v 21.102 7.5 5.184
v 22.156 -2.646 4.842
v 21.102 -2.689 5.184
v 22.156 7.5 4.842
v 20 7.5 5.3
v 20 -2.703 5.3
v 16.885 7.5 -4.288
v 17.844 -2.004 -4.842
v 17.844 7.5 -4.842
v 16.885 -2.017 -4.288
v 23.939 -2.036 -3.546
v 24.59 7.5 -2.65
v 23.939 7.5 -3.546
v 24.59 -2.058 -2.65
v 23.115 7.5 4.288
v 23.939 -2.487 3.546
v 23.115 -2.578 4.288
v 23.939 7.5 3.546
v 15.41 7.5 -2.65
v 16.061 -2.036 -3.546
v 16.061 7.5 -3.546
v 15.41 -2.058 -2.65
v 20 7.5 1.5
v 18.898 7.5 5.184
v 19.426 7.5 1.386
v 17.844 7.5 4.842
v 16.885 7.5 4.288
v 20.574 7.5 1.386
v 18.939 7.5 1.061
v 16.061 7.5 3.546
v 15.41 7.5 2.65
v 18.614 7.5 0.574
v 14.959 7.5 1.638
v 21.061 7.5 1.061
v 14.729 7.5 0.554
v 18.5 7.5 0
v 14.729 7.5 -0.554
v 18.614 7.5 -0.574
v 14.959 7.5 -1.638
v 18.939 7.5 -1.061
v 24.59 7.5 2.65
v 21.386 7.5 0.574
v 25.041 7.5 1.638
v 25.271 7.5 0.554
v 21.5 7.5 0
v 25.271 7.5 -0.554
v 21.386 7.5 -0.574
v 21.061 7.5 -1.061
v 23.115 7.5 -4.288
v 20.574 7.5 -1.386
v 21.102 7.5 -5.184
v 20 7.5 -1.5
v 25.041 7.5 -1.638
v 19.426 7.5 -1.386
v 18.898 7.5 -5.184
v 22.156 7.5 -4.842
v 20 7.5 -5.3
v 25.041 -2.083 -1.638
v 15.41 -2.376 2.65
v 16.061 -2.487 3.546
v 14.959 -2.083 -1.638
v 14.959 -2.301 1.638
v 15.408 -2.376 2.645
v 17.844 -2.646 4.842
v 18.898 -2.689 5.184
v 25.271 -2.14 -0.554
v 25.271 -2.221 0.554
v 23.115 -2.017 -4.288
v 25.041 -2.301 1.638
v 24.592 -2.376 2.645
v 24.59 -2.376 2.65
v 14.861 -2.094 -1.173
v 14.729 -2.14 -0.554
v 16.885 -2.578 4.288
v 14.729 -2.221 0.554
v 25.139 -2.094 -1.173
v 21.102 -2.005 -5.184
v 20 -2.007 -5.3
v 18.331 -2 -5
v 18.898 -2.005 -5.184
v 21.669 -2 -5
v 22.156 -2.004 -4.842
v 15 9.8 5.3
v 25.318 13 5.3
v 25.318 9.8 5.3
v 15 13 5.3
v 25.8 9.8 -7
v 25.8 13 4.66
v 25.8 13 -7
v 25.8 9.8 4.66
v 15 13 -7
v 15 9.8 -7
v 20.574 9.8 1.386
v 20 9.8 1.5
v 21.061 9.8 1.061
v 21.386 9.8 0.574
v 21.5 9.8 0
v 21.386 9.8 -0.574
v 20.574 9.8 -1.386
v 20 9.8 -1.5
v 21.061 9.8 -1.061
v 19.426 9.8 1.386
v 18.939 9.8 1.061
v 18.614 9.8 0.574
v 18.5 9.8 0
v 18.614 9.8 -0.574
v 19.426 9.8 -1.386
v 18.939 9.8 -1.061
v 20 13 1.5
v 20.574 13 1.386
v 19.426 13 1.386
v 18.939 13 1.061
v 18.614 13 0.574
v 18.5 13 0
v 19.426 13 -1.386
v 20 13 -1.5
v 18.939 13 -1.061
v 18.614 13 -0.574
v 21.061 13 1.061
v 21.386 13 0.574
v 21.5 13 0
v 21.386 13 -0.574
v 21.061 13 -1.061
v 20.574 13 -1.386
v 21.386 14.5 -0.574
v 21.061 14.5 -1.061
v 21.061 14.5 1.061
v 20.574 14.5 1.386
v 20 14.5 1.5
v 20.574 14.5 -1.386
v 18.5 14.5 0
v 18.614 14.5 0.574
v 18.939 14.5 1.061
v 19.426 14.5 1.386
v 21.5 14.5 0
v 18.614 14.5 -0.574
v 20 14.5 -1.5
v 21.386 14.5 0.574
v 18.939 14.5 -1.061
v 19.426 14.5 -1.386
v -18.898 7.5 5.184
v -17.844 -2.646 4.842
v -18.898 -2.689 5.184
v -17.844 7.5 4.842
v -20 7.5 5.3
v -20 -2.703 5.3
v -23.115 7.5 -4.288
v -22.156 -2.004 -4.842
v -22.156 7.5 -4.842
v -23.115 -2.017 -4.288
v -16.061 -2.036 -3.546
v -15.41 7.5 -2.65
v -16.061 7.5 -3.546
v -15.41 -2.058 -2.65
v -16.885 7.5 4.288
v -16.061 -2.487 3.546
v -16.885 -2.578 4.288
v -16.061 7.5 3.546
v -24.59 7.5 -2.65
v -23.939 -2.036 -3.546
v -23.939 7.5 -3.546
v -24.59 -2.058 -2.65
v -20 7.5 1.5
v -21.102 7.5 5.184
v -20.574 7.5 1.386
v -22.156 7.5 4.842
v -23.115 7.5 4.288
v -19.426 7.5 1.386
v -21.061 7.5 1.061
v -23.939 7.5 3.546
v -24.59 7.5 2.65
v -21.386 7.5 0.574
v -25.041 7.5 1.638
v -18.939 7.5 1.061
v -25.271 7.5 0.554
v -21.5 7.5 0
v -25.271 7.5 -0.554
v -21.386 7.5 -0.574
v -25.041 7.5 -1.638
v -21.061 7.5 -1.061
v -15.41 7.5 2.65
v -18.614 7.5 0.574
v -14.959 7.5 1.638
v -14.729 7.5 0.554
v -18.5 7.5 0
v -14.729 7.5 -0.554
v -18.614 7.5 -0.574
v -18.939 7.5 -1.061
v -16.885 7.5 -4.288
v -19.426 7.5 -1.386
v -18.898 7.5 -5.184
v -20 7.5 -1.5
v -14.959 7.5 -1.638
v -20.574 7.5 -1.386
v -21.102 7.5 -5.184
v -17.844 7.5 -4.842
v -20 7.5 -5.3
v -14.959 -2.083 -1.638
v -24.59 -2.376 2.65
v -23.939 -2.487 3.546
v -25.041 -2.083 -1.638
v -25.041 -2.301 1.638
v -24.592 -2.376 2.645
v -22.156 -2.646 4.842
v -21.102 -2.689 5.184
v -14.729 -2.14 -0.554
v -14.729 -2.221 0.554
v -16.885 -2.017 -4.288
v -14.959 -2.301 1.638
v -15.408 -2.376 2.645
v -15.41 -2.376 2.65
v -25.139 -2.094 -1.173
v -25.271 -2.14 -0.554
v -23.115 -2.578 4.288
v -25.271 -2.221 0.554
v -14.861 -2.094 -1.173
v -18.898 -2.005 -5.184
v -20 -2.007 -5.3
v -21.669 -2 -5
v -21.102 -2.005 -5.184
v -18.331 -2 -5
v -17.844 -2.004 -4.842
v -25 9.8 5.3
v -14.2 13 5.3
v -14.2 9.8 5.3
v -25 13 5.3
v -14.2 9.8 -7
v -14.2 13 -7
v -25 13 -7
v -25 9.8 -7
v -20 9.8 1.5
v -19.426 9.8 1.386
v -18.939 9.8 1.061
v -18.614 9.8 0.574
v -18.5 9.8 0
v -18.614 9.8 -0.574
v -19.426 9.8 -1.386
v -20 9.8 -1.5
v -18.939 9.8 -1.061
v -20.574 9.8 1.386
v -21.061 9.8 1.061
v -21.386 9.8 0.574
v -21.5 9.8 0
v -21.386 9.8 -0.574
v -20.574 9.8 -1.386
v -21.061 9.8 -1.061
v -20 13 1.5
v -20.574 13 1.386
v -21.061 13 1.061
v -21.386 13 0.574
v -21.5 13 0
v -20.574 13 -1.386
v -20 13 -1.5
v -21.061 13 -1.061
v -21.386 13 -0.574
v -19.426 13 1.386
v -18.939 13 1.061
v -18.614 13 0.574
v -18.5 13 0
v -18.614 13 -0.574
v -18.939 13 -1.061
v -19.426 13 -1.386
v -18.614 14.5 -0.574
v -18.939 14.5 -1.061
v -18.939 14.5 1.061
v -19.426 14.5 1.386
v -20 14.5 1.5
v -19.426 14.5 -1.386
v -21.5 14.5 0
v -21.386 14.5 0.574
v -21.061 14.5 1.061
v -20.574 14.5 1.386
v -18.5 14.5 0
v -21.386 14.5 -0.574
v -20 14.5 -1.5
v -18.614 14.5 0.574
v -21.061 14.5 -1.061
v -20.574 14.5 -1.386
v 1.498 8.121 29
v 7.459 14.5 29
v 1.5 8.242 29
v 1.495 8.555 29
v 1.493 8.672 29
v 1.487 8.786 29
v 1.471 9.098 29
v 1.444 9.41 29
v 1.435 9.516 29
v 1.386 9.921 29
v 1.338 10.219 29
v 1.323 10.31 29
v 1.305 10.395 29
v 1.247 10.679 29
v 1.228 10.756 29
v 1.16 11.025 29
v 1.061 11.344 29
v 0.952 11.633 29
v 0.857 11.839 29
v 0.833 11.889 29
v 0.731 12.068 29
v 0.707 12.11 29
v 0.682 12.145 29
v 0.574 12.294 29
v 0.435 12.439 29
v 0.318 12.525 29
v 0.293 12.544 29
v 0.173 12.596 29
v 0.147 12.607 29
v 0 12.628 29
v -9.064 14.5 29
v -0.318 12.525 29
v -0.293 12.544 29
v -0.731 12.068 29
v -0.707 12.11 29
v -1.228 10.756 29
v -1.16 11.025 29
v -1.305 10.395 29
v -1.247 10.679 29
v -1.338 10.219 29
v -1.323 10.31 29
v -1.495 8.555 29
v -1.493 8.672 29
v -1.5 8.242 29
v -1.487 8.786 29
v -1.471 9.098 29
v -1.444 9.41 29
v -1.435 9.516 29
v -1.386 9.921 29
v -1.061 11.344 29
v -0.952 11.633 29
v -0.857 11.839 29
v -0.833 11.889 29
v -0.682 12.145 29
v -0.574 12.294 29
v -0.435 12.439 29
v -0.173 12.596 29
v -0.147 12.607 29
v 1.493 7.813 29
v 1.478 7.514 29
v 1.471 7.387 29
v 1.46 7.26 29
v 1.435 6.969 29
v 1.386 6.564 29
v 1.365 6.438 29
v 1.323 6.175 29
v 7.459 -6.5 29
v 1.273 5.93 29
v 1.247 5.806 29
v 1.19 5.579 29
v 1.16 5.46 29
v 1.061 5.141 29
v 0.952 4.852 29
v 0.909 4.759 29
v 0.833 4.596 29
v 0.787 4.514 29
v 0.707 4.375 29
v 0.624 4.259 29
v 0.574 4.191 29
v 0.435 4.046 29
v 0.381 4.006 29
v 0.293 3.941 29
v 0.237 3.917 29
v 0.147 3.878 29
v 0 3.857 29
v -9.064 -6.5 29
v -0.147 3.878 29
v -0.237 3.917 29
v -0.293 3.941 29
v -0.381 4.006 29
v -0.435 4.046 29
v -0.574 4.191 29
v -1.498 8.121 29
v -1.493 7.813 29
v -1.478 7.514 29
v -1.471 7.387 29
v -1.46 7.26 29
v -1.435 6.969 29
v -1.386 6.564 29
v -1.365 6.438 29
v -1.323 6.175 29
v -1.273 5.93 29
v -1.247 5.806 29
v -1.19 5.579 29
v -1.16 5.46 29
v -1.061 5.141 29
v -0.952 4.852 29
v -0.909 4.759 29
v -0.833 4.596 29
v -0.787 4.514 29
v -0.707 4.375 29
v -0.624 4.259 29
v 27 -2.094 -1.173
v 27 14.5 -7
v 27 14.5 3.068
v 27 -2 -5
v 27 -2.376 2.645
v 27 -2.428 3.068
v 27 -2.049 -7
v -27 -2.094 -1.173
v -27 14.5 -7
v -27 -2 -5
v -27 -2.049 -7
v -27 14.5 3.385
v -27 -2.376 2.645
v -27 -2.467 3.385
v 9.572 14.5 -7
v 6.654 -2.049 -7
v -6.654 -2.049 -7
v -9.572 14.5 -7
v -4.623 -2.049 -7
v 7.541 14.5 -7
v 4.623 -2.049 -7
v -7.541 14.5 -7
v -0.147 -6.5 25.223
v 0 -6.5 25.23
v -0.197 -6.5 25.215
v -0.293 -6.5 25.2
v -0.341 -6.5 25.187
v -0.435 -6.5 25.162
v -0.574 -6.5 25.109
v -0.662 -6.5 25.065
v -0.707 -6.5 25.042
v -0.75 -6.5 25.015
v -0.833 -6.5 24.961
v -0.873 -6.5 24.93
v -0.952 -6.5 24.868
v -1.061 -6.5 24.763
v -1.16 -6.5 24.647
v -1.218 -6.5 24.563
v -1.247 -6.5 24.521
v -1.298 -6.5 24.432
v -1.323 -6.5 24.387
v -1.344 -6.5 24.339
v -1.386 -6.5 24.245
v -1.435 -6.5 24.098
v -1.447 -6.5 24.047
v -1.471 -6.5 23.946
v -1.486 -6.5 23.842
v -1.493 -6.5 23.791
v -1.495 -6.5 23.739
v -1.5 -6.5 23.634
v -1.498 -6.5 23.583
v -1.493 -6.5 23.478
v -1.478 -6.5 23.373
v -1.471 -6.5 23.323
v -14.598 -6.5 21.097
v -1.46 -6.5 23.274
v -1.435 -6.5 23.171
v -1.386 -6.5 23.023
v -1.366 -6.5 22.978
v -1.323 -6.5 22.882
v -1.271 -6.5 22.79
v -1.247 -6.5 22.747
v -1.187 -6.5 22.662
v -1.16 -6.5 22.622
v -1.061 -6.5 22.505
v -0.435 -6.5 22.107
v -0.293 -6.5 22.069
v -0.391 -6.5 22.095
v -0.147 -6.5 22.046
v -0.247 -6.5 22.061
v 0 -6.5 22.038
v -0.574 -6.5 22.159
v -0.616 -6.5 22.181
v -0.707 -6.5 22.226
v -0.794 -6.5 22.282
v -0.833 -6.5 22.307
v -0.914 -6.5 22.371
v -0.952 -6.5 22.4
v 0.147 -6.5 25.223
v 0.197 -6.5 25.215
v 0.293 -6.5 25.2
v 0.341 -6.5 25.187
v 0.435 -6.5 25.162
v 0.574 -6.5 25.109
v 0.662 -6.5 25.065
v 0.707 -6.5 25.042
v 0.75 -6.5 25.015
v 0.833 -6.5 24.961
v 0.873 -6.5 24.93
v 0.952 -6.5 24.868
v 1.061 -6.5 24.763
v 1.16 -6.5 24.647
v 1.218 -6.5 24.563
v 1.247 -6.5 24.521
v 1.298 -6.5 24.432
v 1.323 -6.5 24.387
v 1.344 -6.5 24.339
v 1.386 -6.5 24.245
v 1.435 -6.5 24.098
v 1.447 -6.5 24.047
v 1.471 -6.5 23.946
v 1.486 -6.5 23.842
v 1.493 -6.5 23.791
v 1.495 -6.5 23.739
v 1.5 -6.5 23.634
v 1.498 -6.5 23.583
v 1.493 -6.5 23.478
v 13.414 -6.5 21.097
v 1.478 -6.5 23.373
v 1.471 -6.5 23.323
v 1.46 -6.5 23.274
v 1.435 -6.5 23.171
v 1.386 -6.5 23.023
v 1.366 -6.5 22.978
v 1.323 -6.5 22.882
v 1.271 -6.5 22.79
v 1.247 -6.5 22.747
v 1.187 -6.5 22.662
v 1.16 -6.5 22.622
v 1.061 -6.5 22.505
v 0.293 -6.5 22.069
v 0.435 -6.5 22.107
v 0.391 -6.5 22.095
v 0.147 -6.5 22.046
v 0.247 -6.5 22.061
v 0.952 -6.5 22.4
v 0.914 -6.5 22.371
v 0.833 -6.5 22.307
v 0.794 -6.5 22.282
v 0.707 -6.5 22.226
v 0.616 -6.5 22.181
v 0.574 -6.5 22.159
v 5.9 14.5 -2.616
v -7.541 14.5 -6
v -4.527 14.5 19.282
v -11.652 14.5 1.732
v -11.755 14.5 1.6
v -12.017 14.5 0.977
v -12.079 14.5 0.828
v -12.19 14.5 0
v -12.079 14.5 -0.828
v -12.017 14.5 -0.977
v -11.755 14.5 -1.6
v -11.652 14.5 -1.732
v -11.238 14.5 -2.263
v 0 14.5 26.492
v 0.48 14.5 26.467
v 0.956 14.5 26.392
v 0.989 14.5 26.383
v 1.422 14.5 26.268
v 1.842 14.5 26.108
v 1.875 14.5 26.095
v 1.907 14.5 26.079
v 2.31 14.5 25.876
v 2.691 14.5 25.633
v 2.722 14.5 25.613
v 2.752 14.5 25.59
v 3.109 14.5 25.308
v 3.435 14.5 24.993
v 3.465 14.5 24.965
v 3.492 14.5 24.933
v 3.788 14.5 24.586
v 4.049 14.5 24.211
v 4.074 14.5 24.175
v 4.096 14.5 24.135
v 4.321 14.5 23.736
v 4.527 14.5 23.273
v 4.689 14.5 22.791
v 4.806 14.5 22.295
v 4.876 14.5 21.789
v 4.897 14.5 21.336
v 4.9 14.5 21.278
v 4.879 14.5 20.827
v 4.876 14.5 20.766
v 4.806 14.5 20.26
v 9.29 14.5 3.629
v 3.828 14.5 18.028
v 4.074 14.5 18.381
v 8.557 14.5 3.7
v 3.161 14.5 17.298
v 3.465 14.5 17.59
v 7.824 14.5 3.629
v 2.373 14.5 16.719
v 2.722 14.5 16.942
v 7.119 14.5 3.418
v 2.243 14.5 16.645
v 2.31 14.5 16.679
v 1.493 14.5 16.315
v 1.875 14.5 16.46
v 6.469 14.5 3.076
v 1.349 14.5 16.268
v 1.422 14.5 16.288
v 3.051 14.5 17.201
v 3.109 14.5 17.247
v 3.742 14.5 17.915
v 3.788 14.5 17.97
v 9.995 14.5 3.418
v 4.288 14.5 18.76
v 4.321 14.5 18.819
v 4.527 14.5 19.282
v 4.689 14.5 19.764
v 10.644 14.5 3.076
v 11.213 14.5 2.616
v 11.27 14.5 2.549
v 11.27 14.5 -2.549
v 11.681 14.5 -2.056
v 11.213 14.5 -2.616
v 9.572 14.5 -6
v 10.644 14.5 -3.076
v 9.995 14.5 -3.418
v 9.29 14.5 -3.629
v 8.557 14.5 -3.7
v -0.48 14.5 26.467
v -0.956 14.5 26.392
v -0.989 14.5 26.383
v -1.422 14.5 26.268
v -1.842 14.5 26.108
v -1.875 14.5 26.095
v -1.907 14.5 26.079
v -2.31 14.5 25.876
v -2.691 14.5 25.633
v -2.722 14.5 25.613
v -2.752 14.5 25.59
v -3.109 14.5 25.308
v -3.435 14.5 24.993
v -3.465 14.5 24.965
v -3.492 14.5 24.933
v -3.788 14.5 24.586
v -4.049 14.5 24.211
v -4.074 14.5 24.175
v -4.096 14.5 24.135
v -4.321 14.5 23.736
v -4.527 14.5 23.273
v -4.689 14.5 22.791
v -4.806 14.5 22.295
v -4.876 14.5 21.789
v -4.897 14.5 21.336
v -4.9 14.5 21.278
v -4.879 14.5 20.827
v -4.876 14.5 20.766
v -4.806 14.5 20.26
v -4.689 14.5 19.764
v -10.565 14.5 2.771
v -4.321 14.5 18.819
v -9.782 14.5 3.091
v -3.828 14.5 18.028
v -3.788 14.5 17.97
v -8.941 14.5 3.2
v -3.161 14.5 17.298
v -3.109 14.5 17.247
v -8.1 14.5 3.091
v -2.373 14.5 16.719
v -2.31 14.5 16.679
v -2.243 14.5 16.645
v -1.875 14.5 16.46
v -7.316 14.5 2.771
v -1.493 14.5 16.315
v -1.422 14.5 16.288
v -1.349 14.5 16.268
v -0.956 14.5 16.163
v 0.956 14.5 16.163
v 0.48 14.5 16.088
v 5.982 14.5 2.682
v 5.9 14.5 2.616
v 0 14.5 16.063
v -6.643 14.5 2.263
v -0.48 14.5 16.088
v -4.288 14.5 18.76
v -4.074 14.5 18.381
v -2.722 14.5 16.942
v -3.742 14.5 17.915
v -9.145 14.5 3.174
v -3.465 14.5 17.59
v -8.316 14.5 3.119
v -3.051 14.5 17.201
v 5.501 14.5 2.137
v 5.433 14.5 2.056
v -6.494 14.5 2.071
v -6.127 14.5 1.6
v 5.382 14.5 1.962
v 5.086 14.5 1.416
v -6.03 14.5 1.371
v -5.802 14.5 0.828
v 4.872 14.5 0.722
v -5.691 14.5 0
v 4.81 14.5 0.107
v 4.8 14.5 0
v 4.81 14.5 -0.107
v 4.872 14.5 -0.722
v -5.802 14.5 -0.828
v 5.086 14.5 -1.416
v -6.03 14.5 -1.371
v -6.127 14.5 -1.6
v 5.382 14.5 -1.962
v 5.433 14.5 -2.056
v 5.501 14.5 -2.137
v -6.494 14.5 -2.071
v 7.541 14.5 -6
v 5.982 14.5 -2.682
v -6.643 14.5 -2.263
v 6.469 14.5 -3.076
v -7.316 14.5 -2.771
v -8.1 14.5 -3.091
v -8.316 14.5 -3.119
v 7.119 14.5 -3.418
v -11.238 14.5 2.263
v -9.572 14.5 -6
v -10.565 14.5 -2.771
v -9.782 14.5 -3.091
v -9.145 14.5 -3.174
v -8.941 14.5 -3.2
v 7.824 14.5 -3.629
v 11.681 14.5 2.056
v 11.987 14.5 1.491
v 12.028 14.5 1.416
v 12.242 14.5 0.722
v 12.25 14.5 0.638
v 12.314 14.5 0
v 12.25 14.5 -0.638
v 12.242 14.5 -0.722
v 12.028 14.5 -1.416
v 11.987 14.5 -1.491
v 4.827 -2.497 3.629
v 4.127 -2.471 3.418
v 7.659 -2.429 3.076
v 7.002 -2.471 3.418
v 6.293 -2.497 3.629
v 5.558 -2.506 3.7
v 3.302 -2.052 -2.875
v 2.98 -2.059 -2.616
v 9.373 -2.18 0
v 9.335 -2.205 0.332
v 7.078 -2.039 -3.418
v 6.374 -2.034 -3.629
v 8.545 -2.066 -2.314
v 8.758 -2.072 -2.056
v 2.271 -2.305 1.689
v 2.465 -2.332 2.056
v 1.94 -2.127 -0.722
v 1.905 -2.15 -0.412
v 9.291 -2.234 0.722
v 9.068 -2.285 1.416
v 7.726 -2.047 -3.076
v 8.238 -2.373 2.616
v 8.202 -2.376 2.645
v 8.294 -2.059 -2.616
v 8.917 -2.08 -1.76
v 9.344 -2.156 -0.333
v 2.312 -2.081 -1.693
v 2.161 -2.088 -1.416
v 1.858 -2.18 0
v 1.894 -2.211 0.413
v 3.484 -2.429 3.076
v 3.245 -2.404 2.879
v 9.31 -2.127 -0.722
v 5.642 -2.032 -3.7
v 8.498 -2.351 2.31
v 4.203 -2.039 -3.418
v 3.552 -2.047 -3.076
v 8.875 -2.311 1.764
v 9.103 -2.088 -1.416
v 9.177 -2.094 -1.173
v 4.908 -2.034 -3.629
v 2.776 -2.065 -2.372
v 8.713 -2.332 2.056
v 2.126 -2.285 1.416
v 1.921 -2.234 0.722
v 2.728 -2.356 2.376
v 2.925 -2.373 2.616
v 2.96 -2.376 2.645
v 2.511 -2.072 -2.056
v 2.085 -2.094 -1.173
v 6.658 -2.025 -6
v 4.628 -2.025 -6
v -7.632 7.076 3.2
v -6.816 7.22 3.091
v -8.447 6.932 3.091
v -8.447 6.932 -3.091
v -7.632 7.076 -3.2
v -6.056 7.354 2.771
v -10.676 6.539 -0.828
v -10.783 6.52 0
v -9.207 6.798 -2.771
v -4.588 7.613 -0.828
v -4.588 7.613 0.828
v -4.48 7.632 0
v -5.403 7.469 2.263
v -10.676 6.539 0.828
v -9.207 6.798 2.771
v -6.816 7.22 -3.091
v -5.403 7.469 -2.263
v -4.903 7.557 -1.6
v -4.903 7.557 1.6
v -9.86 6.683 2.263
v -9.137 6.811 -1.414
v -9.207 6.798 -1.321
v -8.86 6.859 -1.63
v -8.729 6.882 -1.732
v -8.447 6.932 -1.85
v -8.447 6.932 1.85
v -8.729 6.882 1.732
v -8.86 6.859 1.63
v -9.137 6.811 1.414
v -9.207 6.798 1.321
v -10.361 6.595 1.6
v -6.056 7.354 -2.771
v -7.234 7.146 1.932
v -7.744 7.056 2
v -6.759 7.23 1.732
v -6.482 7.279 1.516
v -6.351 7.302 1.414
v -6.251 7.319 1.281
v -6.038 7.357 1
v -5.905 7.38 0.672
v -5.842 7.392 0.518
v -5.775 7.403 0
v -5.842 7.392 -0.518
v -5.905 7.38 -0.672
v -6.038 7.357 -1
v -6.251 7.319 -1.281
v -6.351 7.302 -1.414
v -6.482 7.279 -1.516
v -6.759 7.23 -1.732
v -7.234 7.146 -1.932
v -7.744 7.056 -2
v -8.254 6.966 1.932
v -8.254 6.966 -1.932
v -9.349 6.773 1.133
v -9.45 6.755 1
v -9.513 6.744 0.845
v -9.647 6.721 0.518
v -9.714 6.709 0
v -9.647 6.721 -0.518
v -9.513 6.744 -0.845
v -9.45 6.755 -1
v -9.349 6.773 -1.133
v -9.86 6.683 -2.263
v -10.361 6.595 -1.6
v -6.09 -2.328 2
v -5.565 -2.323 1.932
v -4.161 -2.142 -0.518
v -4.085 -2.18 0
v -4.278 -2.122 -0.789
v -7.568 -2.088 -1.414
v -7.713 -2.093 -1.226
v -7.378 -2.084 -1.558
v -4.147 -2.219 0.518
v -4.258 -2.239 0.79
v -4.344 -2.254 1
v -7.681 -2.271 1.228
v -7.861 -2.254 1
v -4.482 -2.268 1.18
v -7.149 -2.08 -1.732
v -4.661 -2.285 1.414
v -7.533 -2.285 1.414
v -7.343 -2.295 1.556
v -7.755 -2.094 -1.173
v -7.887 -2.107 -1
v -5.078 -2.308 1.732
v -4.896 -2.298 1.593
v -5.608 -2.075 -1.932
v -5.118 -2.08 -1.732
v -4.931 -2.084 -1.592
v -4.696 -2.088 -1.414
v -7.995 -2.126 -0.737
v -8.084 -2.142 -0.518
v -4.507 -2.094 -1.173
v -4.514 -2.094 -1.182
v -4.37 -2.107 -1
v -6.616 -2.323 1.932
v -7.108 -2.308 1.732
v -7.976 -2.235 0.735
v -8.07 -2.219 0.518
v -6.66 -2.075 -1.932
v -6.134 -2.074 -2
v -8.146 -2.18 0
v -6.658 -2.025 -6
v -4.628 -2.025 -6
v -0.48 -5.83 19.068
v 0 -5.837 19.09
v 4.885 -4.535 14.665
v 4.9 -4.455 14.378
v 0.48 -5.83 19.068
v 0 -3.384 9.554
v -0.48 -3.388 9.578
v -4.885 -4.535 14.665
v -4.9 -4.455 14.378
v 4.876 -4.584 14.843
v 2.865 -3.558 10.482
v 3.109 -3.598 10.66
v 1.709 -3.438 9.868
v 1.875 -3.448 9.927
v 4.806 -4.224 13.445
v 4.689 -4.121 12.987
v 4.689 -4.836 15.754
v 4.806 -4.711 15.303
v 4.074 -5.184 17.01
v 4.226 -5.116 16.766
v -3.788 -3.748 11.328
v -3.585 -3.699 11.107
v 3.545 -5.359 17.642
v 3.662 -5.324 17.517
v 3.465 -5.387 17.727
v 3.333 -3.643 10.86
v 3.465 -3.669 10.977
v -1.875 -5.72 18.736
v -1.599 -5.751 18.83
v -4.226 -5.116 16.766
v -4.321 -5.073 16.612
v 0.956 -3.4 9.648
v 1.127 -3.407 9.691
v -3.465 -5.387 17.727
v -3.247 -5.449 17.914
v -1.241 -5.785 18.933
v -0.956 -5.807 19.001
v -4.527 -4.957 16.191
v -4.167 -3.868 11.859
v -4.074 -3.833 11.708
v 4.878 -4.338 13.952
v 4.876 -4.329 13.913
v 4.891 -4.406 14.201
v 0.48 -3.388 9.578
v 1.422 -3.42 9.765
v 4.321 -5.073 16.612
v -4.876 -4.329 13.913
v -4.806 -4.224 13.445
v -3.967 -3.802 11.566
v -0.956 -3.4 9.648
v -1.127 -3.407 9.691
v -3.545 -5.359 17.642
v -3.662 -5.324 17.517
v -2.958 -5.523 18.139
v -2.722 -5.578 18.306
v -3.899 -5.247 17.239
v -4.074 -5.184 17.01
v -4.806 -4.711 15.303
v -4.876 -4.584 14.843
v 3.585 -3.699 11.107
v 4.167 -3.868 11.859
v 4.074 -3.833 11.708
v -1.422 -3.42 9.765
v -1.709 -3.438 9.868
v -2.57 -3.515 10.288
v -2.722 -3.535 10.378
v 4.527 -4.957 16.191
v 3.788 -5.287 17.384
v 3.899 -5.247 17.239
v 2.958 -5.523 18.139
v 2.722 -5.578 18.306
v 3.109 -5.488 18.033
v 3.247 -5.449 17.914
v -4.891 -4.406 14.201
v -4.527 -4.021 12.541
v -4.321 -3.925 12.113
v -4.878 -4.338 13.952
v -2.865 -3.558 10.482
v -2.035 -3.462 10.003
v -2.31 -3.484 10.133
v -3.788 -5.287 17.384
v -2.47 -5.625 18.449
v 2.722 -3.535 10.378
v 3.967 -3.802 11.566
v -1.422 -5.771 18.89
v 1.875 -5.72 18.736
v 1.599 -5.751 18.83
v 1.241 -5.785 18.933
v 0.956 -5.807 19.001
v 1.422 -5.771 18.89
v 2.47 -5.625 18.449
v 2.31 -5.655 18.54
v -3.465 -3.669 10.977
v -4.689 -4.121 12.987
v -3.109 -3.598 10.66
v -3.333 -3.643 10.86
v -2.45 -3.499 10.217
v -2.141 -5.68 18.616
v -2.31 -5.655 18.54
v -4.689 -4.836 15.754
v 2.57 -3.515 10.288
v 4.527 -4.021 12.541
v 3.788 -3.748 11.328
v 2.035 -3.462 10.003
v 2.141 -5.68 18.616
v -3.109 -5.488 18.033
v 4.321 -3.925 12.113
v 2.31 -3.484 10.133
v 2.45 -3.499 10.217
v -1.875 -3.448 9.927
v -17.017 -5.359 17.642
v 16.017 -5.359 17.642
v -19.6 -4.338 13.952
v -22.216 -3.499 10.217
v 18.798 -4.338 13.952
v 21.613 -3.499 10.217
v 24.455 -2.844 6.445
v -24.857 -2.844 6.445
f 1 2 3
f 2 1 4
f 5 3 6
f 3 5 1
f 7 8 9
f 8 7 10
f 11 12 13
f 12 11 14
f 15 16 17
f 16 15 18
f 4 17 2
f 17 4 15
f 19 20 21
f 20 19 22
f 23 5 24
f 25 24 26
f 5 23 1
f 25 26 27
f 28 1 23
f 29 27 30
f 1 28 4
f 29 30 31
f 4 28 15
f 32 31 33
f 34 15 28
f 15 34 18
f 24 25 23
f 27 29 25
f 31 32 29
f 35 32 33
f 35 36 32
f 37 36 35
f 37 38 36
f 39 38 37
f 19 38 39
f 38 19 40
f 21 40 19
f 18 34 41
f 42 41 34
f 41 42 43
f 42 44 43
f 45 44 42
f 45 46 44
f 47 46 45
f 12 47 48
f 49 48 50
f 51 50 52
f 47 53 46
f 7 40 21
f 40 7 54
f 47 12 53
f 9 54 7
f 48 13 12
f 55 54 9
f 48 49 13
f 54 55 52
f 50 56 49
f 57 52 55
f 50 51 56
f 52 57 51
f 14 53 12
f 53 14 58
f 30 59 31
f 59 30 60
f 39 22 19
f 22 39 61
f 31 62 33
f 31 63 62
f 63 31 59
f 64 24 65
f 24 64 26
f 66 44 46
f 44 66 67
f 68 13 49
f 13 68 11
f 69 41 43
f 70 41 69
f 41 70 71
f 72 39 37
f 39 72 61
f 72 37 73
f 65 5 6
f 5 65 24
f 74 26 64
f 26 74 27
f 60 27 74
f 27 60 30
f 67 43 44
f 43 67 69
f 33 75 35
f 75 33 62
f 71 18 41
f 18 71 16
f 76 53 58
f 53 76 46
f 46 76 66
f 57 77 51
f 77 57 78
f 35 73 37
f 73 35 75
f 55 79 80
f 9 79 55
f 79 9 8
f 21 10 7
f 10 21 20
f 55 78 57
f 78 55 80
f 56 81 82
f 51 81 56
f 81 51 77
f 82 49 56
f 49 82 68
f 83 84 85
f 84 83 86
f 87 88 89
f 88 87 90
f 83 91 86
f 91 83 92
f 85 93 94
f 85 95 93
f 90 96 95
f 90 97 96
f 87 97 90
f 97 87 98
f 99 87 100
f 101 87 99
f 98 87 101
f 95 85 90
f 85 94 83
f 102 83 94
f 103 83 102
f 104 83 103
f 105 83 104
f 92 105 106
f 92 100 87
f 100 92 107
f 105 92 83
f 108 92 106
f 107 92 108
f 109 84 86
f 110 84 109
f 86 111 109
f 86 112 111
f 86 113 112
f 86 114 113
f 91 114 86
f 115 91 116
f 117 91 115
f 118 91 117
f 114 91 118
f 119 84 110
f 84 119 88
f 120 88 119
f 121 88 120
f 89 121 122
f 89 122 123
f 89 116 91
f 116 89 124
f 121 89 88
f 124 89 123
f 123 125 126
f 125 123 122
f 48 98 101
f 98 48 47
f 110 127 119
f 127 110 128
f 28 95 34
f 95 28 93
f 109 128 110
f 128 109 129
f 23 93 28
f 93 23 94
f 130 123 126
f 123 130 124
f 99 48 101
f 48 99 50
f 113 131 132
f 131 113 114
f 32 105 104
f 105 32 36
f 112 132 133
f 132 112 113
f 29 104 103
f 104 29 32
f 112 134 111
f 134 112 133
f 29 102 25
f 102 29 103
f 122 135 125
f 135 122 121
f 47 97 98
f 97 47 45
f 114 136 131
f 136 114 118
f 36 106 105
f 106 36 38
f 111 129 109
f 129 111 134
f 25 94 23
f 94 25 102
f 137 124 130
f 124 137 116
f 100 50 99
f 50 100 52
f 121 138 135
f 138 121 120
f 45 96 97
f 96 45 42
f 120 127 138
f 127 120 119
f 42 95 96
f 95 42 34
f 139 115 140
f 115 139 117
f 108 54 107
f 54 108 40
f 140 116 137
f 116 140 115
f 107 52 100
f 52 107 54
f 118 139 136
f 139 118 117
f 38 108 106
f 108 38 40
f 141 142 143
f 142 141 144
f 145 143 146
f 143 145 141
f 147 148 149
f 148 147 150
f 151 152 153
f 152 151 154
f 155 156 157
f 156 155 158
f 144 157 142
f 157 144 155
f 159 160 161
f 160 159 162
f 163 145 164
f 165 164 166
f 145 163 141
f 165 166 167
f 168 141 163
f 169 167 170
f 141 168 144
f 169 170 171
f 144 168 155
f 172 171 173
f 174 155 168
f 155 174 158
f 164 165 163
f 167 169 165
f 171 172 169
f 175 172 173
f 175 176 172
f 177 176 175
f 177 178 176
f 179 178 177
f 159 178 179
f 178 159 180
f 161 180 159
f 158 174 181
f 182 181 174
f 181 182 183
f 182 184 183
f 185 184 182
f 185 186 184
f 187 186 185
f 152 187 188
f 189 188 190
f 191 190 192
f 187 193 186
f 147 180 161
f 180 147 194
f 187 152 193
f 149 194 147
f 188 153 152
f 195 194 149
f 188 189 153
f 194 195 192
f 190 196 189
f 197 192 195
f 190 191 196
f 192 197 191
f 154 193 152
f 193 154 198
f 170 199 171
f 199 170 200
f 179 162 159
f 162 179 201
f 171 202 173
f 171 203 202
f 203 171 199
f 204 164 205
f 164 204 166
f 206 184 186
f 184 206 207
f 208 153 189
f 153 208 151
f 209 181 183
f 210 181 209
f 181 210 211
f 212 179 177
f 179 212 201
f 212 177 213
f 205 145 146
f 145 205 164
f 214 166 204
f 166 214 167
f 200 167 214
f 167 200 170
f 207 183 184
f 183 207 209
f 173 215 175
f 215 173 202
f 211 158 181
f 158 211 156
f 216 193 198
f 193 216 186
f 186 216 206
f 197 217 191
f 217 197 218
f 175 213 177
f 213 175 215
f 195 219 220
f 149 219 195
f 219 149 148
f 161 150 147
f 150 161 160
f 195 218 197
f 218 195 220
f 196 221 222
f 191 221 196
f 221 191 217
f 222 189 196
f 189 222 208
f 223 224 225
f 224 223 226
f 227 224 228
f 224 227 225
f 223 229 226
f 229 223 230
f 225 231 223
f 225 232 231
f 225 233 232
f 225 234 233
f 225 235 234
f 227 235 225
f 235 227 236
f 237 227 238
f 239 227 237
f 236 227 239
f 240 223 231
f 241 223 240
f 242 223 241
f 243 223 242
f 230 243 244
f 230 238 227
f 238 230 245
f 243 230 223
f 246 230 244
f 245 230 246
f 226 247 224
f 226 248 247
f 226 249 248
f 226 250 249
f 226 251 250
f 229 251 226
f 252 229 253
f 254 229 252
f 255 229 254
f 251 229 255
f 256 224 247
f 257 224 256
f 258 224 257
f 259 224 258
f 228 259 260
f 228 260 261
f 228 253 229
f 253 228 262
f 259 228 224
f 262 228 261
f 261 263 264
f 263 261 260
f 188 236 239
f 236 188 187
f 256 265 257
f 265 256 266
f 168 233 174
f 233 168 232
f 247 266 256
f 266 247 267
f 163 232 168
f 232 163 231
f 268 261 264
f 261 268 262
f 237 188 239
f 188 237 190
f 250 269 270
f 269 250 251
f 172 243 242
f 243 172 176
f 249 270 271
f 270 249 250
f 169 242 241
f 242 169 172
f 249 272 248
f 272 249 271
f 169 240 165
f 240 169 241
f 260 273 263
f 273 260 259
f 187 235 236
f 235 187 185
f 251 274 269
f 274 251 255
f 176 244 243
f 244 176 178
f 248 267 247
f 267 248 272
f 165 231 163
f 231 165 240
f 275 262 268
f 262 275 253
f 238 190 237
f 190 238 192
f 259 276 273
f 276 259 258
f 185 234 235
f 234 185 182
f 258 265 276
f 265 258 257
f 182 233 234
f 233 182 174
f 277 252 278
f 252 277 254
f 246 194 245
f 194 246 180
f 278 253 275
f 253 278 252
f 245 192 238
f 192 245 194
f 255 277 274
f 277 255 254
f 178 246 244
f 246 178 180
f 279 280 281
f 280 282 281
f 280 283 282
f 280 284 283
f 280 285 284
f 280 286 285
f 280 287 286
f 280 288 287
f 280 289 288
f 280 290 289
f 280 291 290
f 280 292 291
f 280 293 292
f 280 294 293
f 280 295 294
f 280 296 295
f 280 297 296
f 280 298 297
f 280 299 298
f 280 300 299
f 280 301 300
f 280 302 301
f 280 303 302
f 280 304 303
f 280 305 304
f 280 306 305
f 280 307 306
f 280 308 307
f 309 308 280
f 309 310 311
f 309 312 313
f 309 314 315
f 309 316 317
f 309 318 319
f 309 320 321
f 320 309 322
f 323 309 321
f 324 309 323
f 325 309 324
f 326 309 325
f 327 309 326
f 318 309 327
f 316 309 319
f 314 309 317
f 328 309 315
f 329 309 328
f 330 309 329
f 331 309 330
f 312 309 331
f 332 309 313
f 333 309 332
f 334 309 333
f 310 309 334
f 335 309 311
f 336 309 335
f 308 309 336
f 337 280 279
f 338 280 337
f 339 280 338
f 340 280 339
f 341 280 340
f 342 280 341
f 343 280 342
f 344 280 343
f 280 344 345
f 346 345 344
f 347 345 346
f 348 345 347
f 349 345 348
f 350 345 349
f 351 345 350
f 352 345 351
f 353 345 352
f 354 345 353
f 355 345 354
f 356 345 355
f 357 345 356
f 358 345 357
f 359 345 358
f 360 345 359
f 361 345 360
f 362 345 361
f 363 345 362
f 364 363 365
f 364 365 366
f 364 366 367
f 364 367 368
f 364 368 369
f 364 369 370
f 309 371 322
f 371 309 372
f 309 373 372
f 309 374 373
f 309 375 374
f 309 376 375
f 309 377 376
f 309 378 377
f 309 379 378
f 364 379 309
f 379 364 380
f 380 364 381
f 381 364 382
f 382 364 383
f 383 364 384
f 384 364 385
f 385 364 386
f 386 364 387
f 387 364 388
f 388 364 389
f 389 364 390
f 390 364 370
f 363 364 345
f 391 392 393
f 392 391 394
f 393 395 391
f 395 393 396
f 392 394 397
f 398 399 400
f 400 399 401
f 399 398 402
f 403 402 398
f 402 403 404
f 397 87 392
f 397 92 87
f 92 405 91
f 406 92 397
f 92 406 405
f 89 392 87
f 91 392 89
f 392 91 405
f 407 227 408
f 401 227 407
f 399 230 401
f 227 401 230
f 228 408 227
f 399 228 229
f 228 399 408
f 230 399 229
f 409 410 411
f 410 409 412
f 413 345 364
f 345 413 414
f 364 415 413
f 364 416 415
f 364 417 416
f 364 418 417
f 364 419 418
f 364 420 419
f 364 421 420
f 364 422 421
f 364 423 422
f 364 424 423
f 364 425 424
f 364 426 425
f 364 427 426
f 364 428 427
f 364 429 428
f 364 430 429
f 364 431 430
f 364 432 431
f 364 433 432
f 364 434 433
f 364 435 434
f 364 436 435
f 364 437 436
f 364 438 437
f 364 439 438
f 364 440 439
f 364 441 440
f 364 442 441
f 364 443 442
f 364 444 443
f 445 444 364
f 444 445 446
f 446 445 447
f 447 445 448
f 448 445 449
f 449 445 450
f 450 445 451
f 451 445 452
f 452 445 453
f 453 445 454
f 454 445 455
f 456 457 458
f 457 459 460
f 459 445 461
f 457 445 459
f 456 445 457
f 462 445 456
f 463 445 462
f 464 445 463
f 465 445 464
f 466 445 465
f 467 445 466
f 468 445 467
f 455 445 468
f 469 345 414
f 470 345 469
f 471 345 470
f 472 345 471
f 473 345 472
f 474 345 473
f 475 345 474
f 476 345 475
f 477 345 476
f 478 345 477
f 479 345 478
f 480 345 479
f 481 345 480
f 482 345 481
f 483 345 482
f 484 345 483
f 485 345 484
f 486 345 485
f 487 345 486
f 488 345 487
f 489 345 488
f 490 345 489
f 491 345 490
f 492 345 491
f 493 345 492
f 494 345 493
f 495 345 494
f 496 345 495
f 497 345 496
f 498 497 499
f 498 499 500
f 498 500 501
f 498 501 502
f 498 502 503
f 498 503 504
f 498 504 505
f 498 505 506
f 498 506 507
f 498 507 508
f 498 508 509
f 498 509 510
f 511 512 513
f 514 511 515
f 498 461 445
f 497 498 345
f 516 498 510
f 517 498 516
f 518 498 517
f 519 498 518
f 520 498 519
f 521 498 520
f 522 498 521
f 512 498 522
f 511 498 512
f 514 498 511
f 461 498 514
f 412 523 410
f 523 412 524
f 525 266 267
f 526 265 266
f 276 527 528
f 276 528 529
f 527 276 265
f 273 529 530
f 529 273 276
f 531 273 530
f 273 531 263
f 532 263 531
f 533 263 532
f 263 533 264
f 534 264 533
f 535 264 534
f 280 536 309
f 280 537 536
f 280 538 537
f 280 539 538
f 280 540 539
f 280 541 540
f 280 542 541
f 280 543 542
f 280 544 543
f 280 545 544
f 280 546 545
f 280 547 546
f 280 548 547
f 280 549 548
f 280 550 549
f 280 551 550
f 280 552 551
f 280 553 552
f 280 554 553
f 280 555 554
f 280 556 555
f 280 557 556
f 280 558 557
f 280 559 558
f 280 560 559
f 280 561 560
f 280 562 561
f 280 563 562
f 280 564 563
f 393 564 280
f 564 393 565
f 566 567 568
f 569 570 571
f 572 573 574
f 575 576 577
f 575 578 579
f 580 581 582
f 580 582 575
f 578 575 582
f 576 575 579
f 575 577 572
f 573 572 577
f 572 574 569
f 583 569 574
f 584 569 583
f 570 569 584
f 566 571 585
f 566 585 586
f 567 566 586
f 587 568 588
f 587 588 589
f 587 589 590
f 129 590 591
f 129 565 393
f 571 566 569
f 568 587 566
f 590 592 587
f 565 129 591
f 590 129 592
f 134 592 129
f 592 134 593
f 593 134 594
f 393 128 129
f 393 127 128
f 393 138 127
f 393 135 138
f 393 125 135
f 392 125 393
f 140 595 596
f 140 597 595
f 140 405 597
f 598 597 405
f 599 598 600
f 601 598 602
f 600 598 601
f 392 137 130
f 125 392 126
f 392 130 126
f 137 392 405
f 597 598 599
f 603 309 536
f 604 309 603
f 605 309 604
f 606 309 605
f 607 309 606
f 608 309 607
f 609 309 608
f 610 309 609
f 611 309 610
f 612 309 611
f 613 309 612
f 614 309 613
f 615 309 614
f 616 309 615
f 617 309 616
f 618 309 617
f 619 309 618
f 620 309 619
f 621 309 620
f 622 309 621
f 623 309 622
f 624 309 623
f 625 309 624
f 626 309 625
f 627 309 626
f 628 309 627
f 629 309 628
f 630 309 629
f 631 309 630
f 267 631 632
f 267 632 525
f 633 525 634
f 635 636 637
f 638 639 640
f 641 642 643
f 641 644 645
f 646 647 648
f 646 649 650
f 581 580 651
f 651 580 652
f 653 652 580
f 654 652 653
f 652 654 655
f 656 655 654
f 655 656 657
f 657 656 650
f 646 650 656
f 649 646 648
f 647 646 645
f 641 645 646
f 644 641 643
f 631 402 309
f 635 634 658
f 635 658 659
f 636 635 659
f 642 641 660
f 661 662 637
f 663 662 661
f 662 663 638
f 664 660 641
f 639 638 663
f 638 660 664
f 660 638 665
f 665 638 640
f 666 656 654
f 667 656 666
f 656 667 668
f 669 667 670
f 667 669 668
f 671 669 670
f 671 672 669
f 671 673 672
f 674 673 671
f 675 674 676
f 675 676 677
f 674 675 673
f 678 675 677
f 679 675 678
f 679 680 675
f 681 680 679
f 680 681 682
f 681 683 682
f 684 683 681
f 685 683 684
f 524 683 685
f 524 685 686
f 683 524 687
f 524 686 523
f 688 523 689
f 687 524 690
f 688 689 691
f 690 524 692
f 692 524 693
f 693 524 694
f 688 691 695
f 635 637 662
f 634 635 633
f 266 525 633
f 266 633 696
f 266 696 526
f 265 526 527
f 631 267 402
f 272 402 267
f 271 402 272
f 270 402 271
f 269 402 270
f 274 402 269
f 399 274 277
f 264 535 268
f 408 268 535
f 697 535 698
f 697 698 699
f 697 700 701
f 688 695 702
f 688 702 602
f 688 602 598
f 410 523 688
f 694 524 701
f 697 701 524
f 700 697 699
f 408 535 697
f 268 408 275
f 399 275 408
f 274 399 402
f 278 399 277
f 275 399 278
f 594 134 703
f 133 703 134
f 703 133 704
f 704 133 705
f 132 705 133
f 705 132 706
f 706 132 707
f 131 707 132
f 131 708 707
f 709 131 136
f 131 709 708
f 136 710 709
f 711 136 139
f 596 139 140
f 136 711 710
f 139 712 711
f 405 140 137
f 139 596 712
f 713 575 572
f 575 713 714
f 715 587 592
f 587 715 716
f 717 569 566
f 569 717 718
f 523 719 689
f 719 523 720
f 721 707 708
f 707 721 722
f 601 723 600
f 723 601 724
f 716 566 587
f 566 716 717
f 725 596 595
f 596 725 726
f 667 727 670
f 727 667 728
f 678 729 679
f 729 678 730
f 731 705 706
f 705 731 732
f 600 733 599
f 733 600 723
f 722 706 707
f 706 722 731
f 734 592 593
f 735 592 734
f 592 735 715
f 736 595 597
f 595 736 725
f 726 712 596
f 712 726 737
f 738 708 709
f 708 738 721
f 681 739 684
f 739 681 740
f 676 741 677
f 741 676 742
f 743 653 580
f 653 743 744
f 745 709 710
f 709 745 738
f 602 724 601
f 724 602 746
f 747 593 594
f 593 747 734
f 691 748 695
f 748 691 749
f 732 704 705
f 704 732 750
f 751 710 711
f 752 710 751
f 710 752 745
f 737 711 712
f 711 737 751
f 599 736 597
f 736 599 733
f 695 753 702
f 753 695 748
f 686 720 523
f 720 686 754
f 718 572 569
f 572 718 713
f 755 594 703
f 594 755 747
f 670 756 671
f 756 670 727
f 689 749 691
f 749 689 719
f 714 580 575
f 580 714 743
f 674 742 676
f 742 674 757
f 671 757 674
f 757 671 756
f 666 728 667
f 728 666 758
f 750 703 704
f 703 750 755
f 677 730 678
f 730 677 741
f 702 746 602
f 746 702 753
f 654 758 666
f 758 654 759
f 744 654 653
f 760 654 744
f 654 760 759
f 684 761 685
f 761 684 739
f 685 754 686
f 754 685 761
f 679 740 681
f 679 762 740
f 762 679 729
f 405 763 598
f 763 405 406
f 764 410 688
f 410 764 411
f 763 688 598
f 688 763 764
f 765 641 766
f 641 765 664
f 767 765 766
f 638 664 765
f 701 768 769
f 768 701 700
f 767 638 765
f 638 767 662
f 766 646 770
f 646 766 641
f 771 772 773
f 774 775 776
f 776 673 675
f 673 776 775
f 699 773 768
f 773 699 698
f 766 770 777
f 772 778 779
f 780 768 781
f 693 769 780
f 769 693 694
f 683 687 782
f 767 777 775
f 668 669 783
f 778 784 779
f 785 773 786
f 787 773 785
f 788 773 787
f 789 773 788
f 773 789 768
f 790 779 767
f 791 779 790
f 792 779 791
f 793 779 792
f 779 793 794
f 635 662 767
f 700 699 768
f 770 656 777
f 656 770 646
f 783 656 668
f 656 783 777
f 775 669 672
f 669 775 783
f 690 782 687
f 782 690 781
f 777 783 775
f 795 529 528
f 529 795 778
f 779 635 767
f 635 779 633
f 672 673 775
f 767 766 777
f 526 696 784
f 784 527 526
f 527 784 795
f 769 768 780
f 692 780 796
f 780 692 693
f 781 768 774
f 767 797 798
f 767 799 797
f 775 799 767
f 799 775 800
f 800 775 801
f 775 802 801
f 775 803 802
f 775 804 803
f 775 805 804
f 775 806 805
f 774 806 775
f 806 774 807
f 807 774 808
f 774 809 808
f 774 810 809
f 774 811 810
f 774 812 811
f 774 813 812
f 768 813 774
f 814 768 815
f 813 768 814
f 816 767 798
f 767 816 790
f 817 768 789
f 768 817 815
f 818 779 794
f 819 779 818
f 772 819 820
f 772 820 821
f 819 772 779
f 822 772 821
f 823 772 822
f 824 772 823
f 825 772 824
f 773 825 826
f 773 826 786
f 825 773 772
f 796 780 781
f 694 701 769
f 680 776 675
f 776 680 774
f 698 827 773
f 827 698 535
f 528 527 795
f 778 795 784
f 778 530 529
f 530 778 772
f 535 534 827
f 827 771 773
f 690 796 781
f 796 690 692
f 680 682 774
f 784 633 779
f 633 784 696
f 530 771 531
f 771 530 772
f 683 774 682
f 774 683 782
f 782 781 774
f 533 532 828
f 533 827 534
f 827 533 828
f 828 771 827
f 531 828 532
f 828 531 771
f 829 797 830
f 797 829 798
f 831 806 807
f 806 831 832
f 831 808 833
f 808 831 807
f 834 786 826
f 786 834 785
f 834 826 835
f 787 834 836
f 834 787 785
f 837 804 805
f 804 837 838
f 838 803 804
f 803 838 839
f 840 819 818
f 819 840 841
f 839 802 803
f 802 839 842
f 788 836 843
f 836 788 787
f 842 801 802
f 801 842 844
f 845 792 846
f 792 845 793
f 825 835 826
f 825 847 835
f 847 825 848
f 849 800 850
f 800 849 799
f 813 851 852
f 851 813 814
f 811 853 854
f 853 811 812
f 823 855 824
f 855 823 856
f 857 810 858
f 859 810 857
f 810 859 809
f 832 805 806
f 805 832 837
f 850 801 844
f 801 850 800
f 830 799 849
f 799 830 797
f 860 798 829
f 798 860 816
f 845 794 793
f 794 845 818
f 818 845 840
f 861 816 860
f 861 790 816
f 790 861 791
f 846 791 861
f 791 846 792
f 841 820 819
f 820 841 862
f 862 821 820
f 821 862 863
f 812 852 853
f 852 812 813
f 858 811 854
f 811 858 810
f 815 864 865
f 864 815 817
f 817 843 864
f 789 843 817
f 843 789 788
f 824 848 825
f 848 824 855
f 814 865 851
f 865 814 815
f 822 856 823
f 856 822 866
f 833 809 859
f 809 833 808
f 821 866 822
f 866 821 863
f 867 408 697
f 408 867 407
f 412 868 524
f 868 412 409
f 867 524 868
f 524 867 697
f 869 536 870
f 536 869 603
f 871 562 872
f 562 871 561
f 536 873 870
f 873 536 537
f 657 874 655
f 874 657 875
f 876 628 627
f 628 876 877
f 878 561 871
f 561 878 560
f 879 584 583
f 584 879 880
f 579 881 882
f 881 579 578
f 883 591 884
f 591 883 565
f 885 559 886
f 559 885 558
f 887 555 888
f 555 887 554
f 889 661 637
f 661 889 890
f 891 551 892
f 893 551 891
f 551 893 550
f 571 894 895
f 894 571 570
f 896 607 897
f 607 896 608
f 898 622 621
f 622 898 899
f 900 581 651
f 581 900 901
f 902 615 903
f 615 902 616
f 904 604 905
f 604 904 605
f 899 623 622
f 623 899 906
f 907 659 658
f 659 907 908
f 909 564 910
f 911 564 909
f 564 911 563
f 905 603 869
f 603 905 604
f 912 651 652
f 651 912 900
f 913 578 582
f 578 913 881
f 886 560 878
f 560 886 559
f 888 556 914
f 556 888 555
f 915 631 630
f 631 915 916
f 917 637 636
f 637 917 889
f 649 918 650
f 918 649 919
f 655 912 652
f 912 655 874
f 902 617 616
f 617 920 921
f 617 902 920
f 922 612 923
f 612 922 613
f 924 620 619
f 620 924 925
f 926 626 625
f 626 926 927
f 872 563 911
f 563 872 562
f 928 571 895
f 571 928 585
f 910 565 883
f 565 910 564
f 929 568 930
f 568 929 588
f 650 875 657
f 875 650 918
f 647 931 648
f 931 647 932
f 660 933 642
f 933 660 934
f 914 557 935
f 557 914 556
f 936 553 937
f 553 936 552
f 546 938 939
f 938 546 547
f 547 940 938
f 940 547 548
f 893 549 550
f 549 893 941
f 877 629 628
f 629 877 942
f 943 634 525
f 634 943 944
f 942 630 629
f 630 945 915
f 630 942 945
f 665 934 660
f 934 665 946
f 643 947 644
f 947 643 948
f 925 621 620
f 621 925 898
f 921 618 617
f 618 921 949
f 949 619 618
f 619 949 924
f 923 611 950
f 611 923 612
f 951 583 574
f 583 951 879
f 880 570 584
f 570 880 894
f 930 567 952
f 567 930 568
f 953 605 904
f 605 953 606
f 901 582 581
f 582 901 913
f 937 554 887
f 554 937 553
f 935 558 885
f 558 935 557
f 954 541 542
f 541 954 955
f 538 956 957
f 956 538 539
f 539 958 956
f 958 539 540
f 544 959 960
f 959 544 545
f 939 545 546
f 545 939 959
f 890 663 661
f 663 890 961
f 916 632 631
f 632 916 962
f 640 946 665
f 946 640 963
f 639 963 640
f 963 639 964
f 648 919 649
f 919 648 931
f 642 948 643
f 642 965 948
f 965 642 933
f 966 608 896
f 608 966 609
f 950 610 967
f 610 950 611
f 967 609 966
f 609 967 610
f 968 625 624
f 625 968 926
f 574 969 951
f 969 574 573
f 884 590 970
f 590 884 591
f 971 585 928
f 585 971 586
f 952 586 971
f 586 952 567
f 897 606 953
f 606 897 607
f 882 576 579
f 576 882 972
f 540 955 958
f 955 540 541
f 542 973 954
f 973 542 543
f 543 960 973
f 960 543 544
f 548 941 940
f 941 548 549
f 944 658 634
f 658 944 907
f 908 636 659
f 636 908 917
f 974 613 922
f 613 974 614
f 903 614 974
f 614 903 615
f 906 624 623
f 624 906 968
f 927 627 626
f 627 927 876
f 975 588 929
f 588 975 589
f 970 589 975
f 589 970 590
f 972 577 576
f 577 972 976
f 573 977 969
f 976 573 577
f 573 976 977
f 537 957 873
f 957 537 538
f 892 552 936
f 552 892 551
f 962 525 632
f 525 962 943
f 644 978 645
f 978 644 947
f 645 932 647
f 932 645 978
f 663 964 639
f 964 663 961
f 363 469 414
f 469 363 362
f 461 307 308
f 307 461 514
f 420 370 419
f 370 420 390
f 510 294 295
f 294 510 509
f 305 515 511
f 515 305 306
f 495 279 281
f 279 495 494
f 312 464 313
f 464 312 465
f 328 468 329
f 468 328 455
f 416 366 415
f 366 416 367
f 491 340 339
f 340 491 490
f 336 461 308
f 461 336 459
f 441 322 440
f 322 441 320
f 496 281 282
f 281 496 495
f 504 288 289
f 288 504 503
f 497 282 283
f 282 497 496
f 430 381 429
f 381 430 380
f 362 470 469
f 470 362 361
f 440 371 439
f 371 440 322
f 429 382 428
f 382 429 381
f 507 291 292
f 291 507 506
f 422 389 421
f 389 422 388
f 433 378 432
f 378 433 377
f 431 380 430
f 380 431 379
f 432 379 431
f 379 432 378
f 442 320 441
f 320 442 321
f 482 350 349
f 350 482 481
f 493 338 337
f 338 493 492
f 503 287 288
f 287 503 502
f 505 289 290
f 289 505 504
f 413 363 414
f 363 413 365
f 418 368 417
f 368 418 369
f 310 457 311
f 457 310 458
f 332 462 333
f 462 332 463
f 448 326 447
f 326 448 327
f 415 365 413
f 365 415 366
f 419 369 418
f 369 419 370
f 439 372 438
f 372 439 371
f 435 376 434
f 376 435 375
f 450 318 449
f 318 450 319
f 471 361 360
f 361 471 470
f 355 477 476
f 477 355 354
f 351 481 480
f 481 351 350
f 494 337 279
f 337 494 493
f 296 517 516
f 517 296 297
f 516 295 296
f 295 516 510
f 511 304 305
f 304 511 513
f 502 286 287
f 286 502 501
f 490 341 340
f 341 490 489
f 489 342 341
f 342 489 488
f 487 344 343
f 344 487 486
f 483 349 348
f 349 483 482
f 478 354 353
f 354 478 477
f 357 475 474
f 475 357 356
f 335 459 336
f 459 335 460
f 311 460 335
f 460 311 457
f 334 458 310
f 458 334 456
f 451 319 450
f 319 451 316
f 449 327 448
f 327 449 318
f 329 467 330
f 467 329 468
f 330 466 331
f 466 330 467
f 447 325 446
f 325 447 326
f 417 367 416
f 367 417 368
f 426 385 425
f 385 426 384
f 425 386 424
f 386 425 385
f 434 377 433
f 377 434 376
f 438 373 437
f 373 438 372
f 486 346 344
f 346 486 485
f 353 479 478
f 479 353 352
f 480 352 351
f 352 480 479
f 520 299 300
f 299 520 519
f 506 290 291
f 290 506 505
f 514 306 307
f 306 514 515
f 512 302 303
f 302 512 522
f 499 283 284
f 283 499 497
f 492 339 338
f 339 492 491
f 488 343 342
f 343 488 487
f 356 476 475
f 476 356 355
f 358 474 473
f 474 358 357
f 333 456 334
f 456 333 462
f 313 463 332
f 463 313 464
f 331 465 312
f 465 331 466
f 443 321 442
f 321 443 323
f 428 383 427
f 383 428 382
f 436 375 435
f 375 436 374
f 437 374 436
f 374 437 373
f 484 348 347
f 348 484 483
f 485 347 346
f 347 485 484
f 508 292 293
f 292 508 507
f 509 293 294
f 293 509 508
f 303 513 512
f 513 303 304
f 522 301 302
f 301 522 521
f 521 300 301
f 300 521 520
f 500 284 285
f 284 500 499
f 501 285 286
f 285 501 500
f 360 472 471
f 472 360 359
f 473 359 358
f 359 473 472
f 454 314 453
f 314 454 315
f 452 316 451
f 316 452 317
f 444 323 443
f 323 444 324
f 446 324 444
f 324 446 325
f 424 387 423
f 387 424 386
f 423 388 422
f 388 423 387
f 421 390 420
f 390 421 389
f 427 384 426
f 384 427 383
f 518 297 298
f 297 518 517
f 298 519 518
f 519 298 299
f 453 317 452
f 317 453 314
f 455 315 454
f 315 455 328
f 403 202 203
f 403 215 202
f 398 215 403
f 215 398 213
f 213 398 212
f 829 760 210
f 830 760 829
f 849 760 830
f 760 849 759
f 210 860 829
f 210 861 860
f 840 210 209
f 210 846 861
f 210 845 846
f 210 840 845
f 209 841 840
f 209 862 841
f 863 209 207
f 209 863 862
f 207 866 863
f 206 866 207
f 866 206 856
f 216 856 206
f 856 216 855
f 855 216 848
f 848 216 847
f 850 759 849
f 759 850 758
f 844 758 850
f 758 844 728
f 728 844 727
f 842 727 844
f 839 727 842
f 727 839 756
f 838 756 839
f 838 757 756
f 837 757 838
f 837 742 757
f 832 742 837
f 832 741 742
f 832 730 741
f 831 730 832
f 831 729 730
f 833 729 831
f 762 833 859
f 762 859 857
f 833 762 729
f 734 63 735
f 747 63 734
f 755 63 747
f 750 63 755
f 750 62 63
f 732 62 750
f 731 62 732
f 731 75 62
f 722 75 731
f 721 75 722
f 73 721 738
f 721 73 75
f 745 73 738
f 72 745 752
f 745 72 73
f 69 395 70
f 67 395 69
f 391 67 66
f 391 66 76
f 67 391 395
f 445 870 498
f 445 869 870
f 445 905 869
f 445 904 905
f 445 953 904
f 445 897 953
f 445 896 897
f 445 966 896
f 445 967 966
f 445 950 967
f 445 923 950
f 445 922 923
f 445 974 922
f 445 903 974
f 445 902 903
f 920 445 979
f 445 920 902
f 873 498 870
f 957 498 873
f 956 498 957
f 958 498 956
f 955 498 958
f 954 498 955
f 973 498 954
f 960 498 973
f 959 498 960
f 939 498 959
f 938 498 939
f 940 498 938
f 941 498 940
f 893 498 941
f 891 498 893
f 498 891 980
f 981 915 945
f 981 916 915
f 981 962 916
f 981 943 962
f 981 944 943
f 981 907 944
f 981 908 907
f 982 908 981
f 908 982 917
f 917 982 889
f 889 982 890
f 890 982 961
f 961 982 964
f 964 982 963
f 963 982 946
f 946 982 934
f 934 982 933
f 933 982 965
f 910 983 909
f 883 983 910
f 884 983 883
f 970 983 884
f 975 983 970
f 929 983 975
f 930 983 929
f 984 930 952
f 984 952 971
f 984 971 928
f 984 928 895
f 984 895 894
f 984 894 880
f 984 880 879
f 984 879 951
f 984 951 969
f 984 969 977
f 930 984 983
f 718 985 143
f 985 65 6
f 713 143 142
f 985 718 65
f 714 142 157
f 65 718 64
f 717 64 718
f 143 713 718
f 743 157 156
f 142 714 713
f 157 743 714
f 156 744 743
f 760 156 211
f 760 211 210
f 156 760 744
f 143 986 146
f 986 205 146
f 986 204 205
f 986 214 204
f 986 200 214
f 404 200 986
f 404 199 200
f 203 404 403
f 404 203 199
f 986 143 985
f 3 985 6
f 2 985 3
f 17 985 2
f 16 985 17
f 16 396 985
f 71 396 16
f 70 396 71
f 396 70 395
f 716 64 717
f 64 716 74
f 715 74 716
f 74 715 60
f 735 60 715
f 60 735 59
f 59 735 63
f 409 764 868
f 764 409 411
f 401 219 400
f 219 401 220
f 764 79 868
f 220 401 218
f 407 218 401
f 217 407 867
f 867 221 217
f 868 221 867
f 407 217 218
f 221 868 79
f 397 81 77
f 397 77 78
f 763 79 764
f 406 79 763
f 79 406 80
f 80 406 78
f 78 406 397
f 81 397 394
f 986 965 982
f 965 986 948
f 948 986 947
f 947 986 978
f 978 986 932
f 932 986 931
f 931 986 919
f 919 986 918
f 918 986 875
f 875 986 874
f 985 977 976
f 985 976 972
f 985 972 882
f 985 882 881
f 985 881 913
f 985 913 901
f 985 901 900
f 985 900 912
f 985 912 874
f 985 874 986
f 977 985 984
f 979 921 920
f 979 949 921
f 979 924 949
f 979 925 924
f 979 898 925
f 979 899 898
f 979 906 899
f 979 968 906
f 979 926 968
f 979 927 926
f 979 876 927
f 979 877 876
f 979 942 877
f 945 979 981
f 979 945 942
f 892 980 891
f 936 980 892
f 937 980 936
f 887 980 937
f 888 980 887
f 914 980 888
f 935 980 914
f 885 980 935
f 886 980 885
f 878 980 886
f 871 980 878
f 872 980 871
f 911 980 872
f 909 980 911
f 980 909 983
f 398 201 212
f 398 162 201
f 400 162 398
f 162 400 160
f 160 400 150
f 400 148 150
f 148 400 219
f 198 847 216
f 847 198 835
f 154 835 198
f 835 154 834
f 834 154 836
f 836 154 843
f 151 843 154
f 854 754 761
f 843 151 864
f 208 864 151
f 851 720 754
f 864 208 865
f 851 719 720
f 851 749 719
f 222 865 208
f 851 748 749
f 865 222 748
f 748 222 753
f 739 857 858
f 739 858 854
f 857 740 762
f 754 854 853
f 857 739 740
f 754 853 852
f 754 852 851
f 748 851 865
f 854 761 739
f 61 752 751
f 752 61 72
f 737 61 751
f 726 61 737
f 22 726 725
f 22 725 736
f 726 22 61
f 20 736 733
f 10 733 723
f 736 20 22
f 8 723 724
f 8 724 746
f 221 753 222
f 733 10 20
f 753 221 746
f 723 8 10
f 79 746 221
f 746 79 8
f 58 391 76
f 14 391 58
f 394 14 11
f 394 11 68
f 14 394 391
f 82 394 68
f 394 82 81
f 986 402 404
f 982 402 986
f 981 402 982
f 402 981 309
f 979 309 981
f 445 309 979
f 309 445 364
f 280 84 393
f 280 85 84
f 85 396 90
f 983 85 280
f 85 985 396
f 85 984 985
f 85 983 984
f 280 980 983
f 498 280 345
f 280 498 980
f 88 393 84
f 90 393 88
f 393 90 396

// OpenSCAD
diameter=10;
height=4;
number=3;
distance=5;
baseline=36; 


module maghole(diameter,height,number,back) {
		translate([0,height*(number-2)/2,0])
        rotate([90,0,0])
         cylinder(r=diameter/2,h=height*(2*number-1),center=true);
    if(back == 1) {
		translate([0,-height*2*(number+1)/2,0])
        rotate([90,0,0])
         cylinder(r=diameter/6,h=height*number,center=true);
    }
}

module smaghole(diameter,height,number,back) {
// Final coordinates for transform are Z, Y, X
		translate([0,(height*(number-2)/2)-1.5,0])
        rotate([90,0,0])
         cylinder(r=0.3+diameter/2,h=height*4,center=true,$fs = 0.01);

    // Square Nut Hole
   translate([-9,-13,-5]) cube([4.3+diameter,3.2,diameter+0.8]);  
   // Pitch SetScrew Hole
    translate([0,(height*(number-2)/2),0]) 
        rotate([90,0,0])
             cylinder(r=1.5,h=40,center=true,$fn=16);  
}

module mirror(diameter,height,number,distance,baseline) {
width=diameter+4;
depth=distance+height*number+4;
length=baseline+diameter+8;
mirrorthick = 2.7;
   difference() {
     translate([0,-height,0])
	   cube([width,  // Small dimension
            depth, // Optical path dim
		      length],center=true);
      translate([0,0,2+baseline/2])
             maghole(diameter,height,number,0);
     translate([0,0,-(2+baseline/2)])
             maghole(diameter,height,number,0);
     translate([0,depth/4,0])
          cube([width+2,depth+2,length-2*width],center=true);
    rotate([7,0,0])
     translate([0,0.6-depth/3,0.75])
          cube([width+2,mirrorthick+0.6,length-(2*diameter+4)],center=true);
     }
}

module sensor(diameter,height,number,distance,baseline) {
width=diameter+4;
depth=distance+height*number+4;
length=baseline+diameter+8;
mirrorthick = 2.6;
//extra=2*width+4;
extra=2*width+8;
laser2015=64; // Degrees
//lasera=74;
lasera=80;
//ptrans2015=116;
//ptransa=106;
ptransa=100;
   difference() {
//     translate([2+width/2,-height,0])
     translate([4+width/2,-height,0])
	   cube([extra,  // Small dimension
            depth, // Optical path dim
		      length],center=true);
      translate([0,0,2+baseline/2])
             smaghole(diameter,height,number,1);
     translate([0,0,-(2+baseline/2)])
             smaghole(diameter,height,number,1);
//LASER
     translate([0,0,6])
        rotate([lasera,0,0])
             cylinder(r=3.7,h=40,center=true,$fn=32);
     translate([-11,0,6])
        rotate([lasera,0,0]) cube([10,2,40],center=true);
//PhotoTransistor
     translate([0,-12,-8.5])
        rotate([ptransa,0,0])
             cylinder(r=3.2,h=10,center=true,$fn=24);
     translate([0,0,-6.5])
        rotate([ptransa,0,0])
             cylinder(r=2,h=40,center=true,$fn=24);
     translate([-11,0,-6])
        rotate([ptransa,0,0]) cube([10,2,40],center=true);
//TEMP SENSOR
     translate([2+width,0,0])
        rotate([90,0,20])
             cylinder(r=4.9,h=40,center=true,$fn=64);
//SET SCREW
     translate([12+width,0,0])
        rotate([90,0,20])
             cylinder(r=1.5,h=40,center=true,$fn=64);
     }
//Through holes for ptrans
//translate([0,-5,-5.3])
//rotate([25,0,0])
 //    difference() {
  //   translate([0,-4,-2.5])cube([5,6,5],center=true);
  //   translate([0,-8,0])
   //     cylinder(r=3.2,h=10,center=true,$fn=12);
   //  translate([0,0,-1.0])
   //     rotate([90,0,0])
   //          cylinder(r=0.7,h=40,center=true,$fn=6);
   //  translate([0,0,-3])
    //    rotate([90,0,0])
     //        cylinder(r=0.7,h=40,center=true,$fn=6);
   //  }
}

module jarwall() {
  difference() {
     cube([40,40,120],center=true);
	  translate([40,0,0])
	     cylinder(r=50,h=120,center=true,$fn=128);
	   }
}

module jar() {
	  translate([-8,110,-10])
	          cylinder(r=78,h=120,center=true,$fn=128);
}

module powerhole(dim) {
offset = dim+2;
  //  cylinder(r=dim,h=2*dim,center=true,$fn=10);
  //  translate([dim-1.6,0,0])
   //   cylinder(r=dim,h=dim,center=true,$fn=10);
    translate([dim-3,0,0]) cube([2*dim+2,2*dim-1,2*dim-1],center=true);
    translate([-offset,0,0])
      cylinder(r=1.1,h=2*dim,center=true,$fn=10);
    translate([offset+2,0,0])
      cylinder(r=1.1,h=2*dim,center=true,$fn=10);
}

module sensordevice() {
  wall = 32;
  side = 44;
  deep = 50;
  difference() { 
   sensor(diameter,height,number,distance,baseline);
   translate([3,-30,3]) jar();
  }
//  translate([-7,-(wall+30),21]) cube([wall,side+12,3]);

//     translate([-7,-(wall+30),-24])
//         cube([wall,side+12,3]);

//  difference() {
//  translate([23.5,-(wall+7),0])
//    rotate([0,90,0])
//    cube([side,deep,3],center=true);
//     translate([24,-54,12])
//			rotate([0,90,0]) 
//           powerhole(4.5);
//  }
}
module mirrordevice() {
  difference() { 
   mirror(diameter,height,number,distance,baseline);
   translate([0,-3.3,0]) rotate([0,0,-90]) jarwall();
  }
}
  // mirrordevice();

module minimum() {
 difference() {
    rotate([0,90,180]) 
           sensordevice();
   translate([34,0,-30])
     rotate([0,35,0])
      cube([42,42,42],center=true);
   translate([-33,0,-30])
     rotate([0,-37,0])
      cube([42,42,42],center=true);
  }
}
//jarwall();
rotate([0,180,0]) minimum();



     
